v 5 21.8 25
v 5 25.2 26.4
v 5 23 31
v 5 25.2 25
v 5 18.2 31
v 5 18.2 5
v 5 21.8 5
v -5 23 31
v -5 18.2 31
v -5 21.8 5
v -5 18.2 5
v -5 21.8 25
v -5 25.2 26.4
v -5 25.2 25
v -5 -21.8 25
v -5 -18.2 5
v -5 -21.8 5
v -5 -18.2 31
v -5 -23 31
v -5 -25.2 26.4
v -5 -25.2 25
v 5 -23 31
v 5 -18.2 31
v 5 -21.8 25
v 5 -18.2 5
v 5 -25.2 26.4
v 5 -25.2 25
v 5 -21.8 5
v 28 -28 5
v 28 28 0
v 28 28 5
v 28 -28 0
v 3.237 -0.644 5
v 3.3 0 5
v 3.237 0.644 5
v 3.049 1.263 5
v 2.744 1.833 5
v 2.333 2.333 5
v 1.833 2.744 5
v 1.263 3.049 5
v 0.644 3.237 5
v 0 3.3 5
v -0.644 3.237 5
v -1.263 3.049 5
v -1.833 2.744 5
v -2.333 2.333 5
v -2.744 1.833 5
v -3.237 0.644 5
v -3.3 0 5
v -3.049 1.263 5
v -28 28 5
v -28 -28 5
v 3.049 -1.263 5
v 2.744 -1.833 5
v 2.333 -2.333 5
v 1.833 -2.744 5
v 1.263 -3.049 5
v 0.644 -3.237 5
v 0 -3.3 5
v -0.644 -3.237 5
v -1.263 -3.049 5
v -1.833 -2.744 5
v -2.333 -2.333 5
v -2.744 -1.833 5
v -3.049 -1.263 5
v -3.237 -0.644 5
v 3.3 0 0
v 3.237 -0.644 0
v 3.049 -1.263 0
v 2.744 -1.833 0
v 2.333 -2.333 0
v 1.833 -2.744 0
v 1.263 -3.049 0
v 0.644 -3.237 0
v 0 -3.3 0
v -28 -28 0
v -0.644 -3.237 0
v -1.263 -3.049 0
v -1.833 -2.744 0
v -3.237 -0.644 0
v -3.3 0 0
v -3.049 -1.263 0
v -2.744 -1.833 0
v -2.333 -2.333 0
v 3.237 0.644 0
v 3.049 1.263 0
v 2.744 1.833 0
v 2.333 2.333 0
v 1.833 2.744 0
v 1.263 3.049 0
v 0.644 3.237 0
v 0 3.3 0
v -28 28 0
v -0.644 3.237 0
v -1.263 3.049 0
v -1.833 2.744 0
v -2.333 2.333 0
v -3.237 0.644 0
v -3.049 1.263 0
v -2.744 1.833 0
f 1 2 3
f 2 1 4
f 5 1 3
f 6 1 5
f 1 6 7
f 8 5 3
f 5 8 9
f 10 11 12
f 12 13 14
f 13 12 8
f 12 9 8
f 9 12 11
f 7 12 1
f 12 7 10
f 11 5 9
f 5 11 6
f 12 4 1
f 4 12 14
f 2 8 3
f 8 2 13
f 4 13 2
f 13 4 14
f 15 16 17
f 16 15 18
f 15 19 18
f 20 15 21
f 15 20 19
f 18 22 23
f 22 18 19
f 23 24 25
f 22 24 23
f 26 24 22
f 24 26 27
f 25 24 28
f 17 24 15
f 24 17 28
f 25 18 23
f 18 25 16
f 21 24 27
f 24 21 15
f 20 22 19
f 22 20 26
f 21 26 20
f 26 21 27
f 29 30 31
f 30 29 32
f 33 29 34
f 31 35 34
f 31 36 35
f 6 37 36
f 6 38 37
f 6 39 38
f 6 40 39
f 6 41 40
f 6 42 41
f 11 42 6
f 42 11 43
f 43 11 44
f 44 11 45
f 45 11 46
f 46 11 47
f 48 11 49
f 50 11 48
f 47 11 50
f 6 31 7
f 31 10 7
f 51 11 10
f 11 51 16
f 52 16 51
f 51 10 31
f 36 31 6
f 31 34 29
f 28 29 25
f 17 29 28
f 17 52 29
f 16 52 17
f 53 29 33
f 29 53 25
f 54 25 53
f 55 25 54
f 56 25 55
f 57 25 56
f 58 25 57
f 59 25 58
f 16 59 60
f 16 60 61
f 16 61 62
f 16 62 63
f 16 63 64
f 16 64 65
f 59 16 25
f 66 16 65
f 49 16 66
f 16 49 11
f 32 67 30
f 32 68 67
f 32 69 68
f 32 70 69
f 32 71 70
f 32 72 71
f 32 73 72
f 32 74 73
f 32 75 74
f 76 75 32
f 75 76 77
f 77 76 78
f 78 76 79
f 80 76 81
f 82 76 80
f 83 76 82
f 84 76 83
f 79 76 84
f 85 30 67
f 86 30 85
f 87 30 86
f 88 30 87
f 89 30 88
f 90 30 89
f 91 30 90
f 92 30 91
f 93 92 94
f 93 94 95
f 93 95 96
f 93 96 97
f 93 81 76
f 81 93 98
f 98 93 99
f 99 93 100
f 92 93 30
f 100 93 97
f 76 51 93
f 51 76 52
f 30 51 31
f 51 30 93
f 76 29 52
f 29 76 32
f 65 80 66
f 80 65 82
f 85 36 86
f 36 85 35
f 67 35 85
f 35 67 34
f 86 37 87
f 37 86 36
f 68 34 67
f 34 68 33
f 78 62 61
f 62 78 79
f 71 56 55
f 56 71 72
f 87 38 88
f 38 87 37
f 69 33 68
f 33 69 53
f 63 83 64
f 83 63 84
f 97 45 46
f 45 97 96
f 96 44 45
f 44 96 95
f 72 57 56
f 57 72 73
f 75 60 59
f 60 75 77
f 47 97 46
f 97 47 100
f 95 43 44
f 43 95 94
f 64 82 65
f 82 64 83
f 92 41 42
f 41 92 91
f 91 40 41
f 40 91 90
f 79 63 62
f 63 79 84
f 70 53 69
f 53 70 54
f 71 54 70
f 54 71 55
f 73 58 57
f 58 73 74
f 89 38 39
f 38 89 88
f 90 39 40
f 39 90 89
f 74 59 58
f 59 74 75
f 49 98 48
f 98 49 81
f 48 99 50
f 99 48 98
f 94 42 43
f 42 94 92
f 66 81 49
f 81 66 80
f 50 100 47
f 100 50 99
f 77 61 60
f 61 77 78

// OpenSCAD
$fn = 32;

// ----------------------------------------------------------------------
// Snap-fit latch: 2 arms, 26 mm tall, 3.6 mm undercut hooks
// ----------------------------------------------------------------------

// --- parameters (mm) ---
base_d = 56;              // base plate depth
base_h = 5;               // base plate thickness
span = 40;                // distance between opposite arms
arm_t = 3.6;              // arm thickness
arm_d = 10;               // arm width
height = 26;              // free arm length
head_len = 3.6;           // hook reach
head_h = 6;               // hook height
lead = 1.4;               // lead-in ramp thickness
bore_d = 6.6;             // base fixing bore
top_z = 31;               // height of the arm tips above the base

arms = 2;

difference() {
  union() {
    /* base plate, centred on the arm ring */
    translate([-28, -28, 0]) cube([base_d, base_d, base_h]);
    for (a = [0 : 360 / arms : 359]) rotate([0, 0, a]) {
    /* arm, sunk 0.5 mm into the base */
    translate([-arm_d / 2, span / 2 - arm_t / 2, base_h - 0.5]) cube([arm_d, arm_t, height + 0.5]);
    /* hook: a convex hull of a tall inner block and a thin outer lip
       gives a flat undercut below and a lead-in ramp on top */
    hull() {
      translate([-arm_d / 2, span / 2 + arm_t / 2 - 0.6, top_z - head_h]) cube([arm_d, lead + 0.4, head_h]);
      translate([-arm_d / 2, span / 2 + arm_t / 2 - 0.2, top_z - head_h]) cube([arm_d, head_len, lead]);
    }
    }
  }
  translate([0, 0, -2.5]) cylinder(h = base_h + 5, d = bore_d);
}
